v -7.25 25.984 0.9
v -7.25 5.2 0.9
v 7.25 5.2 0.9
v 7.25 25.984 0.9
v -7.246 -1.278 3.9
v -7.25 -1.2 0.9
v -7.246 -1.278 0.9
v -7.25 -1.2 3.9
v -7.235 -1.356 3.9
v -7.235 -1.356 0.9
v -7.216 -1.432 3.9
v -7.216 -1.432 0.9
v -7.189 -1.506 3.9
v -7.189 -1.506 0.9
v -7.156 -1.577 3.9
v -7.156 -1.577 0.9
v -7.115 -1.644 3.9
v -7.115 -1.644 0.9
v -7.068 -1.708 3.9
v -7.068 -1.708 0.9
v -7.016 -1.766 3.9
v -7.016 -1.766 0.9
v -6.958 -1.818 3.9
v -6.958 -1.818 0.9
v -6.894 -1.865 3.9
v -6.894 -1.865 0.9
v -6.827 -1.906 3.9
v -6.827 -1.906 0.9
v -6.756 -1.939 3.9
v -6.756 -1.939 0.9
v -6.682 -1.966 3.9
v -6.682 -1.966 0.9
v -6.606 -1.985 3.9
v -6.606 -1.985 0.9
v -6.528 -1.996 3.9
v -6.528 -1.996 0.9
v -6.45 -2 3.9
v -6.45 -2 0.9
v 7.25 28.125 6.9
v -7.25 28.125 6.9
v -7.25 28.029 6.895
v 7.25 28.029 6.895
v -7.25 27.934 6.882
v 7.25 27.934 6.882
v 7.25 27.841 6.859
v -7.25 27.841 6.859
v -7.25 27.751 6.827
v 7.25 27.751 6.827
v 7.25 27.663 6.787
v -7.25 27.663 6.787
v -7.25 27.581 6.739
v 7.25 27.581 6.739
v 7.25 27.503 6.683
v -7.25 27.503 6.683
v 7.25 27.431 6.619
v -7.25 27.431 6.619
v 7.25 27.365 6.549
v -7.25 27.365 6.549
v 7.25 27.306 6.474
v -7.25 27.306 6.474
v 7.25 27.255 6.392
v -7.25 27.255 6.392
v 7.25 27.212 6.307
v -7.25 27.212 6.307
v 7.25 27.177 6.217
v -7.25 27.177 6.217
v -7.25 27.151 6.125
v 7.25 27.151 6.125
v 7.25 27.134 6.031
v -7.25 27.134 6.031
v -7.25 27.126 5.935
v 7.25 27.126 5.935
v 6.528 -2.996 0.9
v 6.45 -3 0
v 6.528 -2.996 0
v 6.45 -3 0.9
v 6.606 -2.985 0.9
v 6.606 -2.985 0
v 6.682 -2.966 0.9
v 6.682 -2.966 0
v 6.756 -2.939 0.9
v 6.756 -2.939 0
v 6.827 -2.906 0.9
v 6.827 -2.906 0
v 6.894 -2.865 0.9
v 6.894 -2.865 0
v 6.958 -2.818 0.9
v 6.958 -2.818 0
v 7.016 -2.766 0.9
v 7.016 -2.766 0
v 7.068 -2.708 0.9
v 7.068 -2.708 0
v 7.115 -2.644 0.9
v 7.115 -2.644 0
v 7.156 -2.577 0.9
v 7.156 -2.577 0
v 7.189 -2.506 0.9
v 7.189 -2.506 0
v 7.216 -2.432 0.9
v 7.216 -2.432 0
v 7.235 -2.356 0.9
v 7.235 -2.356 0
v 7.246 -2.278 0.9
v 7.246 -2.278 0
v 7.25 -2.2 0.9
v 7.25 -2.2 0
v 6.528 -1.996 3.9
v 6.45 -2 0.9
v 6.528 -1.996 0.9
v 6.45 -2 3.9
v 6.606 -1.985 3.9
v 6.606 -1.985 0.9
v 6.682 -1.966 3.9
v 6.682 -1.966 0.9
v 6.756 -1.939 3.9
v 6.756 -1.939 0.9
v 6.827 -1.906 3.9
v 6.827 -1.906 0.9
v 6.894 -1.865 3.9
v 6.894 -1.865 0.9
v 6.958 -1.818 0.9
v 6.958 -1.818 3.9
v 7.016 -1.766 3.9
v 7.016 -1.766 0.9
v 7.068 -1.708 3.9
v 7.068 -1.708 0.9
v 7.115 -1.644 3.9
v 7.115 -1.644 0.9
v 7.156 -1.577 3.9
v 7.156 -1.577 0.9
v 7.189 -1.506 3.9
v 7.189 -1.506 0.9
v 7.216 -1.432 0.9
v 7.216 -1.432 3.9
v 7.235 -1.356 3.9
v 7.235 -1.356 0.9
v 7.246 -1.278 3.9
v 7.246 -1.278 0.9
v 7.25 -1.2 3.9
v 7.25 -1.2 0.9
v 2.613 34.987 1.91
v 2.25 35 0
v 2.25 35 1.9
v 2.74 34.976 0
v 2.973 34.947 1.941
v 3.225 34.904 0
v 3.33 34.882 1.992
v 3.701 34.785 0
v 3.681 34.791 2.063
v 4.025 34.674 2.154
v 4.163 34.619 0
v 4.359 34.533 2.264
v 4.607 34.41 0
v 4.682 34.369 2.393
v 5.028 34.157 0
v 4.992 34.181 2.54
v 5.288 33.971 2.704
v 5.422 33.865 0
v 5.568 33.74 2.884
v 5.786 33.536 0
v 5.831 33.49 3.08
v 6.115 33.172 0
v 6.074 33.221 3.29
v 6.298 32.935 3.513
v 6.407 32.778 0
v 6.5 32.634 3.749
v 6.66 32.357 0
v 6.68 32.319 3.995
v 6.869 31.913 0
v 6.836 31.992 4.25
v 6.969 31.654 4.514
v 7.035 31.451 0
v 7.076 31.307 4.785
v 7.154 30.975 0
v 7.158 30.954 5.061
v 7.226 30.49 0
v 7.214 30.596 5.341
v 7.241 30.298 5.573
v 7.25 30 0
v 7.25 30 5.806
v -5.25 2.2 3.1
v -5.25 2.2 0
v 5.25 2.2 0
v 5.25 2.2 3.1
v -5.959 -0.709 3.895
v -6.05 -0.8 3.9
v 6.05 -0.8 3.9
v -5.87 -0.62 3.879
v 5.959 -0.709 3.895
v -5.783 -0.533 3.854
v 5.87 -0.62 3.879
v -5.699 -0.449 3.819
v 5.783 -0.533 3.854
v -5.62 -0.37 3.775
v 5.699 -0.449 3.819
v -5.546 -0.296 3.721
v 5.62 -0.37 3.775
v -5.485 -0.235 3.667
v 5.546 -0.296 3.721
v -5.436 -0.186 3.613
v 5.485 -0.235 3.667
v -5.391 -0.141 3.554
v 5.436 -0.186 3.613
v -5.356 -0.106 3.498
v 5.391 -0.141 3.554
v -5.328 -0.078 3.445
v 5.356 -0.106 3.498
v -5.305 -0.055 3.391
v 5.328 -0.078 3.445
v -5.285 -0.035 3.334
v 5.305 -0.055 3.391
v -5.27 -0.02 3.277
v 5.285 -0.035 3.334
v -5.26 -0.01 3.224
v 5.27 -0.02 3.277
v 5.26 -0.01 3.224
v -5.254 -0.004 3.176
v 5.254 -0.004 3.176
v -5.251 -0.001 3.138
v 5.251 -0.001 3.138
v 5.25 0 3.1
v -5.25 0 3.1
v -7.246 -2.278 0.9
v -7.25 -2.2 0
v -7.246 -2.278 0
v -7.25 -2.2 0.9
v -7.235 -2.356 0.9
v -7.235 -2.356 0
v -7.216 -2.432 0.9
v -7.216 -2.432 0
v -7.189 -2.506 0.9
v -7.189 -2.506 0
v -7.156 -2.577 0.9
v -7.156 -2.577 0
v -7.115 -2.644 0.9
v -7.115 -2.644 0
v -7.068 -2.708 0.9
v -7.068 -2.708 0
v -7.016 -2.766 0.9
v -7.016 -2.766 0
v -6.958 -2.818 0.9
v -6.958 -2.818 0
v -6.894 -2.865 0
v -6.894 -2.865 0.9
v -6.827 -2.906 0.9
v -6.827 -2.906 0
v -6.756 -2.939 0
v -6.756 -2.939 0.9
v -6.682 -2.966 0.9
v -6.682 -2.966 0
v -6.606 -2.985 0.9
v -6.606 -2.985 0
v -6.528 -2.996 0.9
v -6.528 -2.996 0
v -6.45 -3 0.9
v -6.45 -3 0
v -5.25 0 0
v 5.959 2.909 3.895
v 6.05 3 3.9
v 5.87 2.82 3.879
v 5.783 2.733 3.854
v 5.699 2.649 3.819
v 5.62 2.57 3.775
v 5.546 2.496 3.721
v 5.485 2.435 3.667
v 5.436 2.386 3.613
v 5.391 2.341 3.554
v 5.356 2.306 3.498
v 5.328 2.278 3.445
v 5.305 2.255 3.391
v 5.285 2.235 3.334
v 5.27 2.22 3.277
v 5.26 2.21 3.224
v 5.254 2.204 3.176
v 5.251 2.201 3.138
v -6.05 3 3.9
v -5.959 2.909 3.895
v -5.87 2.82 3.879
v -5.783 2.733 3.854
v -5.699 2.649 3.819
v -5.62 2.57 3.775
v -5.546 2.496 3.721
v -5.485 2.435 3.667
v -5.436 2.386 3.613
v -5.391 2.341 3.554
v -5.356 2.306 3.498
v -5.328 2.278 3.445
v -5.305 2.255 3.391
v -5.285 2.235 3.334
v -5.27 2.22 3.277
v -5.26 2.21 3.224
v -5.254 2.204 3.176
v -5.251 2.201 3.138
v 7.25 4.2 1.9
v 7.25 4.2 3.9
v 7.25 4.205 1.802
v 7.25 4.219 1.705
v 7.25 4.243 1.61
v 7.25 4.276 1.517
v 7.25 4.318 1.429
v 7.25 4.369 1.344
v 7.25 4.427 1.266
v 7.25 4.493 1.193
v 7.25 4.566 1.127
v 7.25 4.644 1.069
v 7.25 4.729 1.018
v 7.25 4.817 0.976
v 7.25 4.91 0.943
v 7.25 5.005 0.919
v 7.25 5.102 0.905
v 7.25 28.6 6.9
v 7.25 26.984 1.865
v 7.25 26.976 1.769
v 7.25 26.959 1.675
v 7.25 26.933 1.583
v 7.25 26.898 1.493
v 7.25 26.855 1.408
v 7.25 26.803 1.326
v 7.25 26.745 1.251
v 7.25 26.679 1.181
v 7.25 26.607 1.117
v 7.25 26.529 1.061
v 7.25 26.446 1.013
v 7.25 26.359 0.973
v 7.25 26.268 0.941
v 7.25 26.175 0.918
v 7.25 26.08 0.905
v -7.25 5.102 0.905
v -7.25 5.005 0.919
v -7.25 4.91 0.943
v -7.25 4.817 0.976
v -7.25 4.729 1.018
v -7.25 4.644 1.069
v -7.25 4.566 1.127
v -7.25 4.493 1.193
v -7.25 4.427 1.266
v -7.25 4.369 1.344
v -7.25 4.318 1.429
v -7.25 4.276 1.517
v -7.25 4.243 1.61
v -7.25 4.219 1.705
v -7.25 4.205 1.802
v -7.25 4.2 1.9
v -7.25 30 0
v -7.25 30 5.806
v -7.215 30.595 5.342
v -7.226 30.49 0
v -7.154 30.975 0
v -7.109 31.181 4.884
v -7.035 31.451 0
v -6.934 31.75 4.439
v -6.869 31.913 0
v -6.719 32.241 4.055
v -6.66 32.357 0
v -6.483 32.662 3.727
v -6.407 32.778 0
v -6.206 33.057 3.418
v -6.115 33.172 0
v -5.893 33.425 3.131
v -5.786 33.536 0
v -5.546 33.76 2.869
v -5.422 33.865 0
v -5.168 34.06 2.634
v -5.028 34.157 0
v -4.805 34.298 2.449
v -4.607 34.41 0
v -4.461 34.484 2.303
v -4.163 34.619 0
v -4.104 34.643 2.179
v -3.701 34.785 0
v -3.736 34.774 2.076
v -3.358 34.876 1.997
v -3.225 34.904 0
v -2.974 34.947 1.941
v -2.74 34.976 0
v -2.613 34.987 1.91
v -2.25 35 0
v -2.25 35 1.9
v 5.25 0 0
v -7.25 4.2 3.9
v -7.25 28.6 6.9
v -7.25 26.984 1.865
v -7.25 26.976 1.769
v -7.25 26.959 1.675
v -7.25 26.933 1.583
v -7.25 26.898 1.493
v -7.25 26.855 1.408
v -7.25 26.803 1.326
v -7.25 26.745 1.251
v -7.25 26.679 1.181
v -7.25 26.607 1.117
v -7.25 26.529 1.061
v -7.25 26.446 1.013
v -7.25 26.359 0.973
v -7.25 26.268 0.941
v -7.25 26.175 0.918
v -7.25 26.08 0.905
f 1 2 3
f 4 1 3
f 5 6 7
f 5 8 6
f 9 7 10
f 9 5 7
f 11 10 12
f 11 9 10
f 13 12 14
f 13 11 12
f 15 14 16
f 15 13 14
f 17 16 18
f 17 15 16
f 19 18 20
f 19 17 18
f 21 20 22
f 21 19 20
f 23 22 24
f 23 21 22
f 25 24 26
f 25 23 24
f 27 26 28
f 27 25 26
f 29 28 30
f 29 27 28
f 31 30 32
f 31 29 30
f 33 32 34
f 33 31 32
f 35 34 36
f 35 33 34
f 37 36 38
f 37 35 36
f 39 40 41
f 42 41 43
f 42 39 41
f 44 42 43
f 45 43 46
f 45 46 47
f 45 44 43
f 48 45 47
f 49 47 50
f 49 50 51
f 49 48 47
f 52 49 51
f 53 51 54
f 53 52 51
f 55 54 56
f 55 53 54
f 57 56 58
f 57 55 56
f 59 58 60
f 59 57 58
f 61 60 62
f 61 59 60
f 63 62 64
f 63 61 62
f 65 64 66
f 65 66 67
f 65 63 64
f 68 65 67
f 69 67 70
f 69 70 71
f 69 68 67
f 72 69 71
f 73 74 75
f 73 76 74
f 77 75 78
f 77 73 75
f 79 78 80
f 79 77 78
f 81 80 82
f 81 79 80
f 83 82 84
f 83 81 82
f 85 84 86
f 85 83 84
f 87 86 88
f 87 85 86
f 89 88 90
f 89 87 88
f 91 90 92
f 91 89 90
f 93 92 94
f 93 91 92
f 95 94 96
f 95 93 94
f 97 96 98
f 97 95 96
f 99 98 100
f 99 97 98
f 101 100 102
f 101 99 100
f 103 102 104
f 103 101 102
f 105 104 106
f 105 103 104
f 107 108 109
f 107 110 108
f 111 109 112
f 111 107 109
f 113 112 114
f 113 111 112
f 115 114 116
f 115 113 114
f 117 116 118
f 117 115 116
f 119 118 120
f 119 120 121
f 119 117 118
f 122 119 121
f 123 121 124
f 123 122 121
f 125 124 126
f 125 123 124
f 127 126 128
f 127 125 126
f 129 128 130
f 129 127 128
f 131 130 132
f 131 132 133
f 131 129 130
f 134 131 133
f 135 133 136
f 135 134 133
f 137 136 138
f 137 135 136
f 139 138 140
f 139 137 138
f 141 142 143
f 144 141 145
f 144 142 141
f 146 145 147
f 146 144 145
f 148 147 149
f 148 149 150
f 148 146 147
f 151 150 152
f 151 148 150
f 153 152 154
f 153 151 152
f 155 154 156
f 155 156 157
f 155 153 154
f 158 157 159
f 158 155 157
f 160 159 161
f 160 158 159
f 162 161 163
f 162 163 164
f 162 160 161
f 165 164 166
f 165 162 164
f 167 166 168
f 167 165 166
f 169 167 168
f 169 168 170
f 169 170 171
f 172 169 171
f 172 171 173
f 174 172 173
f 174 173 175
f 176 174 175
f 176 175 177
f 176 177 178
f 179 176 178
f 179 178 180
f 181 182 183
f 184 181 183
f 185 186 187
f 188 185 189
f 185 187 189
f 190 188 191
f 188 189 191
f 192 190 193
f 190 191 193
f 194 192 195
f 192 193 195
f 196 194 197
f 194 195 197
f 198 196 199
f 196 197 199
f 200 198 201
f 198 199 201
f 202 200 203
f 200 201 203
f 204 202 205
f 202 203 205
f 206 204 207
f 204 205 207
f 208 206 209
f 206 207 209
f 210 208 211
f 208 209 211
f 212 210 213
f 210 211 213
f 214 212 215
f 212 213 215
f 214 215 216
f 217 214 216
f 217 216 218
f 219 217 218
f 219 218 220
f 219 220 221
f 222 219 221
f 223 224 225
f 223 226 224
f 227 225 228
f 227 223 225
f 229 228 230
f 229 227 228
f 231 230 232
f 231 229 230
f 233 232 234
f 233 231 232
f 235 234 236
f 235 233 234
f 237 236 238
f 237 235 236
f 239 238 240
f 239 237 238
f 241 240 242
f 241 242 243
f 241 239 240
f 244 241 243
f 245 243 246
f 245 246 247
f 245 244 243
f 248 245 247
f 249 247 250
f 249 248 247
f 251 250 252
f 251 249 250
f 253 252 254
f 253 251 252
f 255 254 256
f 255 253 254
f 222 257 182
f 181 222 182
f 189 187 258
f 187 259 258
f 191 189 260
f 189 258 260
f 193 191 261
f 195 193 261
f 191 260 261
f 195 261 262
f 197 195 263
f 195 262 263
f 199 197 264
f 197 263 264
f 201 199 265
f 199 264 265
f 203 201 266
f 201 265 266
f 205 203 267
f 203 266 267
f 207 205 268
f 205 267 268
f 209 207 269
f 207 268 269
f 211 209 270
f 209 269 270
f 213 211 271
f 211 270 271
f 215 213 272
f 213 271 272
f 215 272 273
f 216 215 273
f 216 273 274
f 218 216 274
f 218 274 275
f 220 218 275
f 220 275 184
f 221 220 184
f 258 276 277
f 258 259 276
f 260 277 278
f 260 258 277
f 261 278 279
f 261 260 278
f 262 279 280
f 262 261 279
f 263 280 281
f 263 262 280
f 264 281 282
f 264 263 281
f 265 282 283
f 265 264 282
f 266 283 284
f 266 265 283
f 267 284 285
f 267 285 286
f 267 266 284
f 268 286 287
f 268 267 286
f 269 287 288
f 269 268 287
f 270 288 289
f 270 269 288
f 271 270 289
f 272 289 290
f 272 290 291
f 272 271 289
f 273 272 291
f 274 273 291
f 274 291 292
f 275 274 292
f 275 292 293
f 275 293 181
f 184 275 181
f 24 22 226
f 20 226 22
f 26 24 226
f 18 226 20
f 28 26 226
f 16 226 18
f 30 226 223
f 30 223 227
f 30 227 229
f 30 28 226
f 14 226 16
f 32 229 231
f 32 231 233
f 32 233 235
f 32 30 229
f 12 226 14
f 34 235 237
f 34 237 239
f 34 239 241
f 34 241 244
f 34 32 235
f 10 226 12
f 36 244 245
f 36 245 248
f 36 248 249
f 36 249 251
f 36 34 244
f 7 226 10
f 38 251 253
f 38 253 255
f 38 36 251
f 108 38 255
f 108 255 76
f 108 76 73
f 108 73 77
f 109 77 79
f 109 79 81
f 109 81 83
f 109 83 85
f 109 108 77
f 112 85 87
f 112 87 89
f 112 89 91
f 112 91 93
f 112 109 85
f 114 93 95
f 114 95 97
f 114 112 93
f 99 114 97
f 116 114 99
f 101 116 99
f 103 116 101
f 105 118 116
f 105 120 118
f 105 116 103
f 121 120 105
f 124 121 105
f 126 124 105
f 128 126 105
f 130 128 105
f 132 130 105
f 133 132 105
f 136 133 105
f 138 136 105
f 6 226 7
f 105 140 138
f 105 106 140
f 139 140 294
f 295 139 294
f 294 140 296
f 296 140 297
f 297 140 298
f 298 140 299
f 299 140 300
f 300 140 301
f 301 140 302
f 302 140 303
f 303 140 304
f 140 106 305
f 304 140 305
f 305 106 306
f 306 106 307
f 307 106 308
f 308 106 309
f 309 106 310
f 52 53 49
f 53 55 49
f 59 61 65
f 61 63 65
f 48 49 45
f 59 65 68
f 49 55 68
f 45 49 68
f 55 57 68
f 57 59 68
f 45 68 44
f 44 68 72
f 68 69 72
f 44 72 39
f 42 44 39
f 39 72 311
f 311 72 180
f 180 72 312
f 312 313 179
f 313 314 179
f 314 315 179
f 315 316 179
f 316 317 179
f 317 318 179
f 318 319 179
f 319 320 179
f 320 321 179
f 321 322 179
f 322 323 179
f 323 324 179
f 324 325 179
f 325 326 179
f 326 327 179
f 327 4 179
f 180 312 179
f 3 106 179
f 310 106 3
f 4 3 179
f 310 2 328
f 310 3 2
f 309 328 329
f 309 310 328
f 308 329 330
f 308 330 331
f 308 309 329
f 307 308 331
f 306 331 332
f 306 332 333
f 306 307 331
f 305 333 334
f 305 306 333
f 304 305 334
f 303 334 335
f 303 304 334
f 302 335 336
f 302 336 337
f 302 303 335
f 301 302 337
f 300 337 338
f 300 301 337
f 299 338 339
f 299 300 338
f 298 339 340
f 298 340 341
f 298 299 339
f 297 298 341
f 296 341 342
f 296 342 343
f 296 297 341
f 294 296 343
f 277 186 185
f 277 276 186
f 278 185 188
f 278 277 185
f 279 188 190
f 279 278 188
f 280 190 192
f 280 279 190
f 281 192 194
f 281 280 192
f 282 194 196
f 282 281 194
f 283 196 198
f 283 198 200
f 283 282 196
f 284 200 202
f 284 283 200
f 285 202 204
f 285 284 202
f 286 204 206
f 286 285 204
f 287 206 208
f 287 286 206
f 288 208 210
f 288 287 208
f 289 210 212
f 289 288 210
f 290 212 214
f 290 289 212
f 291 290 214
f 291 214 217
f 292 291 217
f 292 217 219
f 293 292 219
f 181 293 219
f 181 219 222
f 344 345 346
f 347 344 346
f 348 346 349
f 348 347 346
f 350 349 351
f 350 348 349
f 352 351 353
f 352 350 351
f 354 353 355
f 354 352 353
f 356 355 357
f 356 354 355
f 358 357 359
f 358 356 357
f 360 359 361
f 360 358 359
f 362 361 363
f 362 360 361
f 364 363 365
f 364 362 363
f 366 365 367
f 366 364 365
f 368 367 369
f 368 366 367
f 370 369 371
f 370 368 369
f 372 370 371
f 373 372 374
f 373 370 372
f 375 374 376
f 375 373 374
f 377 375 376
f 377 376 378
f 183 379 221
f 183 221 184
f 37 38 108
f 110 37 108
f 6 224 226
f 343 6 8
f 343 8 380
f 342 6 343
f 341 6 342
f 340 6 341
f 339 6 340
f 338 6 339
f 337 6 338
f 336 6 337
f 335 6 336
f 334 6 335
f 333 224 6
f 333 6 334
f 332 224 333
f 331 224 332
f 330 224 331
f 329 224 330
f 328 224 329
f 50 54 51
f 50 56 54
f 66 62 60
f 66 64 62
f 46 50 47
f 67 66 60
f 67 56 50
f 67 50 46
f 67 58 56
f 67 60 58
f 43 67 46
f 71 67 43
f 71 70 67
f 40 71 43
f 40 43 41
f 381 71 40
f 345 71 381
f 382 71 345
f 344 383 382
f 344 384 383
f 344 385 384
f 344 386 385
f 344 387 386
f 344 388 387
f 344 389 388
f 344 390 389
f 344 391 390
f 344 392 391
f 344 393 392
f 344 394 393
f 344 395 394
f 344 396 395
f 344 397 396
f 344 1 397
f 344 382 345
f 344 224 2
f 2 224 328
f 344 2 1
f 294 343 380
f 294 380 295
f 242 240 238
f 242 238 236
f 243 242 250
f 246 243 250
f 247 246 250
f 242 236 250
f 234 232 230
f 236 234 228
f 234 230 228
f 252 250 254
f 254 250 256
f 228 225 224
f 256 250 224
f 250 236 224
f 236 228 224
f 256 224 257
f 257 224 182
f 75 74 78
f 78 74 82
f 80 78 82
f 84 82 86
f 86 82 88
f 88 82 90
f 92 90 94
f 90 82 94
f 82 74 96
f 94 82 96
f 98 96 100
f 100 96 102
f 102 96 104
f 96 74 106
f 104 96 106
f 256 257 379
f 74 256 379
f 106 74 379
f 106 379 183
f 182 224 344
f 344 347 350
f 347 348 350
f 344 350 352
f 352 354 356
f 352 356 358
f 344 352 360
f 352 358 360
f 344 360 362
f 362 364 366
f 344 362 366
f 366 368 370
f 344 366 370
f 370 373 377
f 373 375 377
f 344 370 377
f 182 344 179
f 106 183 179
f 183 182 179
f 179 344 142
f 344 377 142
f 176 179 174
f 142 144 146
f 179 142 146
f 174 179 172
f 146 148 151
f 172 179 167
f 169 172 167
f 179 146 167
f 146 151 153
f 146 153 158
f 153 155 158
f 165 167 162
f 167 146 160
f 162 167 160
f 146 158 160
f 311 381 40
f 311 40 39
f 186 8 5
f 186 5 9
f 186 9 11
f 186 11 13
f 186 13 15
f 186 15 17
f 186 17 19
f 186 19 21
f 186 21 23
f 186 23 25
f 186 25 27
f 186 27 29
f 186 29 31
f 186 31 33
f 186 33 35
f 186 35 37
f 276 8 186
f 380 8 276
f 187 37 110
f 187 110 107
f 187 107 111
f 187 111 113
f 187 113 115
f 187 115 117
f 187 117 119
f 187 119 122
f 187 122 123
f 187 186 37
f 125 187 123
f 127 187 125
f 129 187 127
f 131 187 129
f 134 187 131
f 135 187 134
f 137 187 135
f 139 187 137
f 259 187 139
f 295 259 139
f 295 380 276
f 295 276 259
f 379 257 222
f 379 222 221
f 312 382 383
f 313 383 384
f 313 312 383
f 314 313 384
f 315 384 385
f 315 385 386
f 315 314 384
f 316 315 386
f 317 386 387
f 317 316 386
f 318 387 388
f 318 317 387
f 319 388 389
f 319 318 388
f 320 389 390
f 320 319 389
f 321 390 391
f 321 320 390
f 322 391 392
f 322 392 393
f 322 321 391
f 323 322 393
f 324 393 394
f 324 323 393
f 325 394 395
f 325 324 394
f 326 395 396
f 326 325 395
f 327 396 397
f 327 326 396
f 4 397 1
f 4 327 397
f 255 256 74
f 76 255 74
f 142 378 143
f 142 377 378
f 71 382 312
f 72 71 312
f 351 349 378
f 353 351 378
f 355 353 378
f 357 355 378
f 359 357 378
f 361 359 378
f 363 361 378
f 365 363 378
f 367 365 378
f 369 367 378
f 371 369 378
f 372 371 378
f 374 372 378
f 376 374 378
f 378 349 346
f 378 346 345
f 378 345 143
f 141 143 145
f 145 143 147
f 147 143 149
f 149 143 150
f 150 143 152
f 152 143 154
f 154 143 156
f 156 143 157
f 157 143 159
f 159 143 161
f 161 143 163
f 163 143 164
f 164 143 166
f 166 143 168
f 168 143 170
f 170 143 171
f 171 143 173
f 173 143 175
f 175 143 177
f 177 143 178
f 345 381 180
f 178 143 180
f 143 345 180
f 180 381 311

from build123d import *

# Parameters (mm, degrees)
SKETCH1_W           = 14.5
SKETCH1_H           = 38
SKETCH1_W_2         = 10.5
SKETCH1_H_2         = 2.2
BOSS_EXTRUDE1_DEPTH = 0.9
SKETCH2_W           = 14.5
SKETCH2_H           = 8.05
BOSS_EXTRUDE2_DEPTH = 6
DRAFT1_ANGLE        = 2
SKETCH2_3_W         = 14.5
SKETCH2_3_H         = 6.2
SKETCH2_3_W_2       = 10.5
SKETCH2_3_H_2       = 2.2
BOSS_EXTRUDE3_DEPTH = 3
CHAMFER1_SIZE       = 5
CHAMFER1_SIZE2      = 6.399708161
FILLET2_R           = 1
FILLET3_R           = 1
FILLET4_R           = 5
FILLET5_R           = 0.8


with BuildPart() as part:
    # Sketch1 → Boss-Extrude1 (new body)
    with BuildSketch(Plane.XY):
        with Locations((0, 16)):
            Rectangle(SKETCH1_W, SKETCH1_H)
        with Locations((0, 1.1)):
            Rectangle(SKETCH1_W_2, SKETCH1_H_2, mode=Mode.SUBTRACT)
    extrude(amount=BOSS_EXTRUDE1_DEPTH)

    # Sketch2 → Boss-Extrude2 (add)
    with BuildSketch(Plane.XY.offset(0.9)):
        with Locations((0, 30.975)):
            Rectangle(SKETCH2_W, SKETCH2_H)
    extrude(amount=BOSS_EXTRUDE2_DEPTH)

    # Draft1
    draft1_faces = [part.faces().sort_by_distance(p)[0] for p in [
        (0, 26.95, 3.9),
    ]]
    draft(draft1_faces, Plane.XY.offset(0.9), DRAFT1_ANGLE)

    # Sketch2<3> → Boss-Extrude3 (add)
    with BuildSketch(Plane.XY.offset(0.9)):
        with Locations((0, 1.1)):
            Rectangle(SKETCH2_3_W, SKETCH2_3_H)
        with Locations((0, 1.1)):
            Rectangle(SKETCH2_3_W_2, SKETCH2_3_H_2, mode=Mode.SUBTRACT)
    extrude(amount=BOSS_EXTRUDE3_DEPTH)

    # Chamfer1
    chamfer1_edges = [part.edges().sort_by_distance(p)[0] for p in [
        (0, 35, 6.9),
    ]]
    chamfer1_side = [part.faces().sort_by_distance(p)[0] for p in [
        (0, 35, 3.45),
    ]]
    chamfer(chamfer1_edges, length=CHAMFER1_SIZE, length2=CHAMFER1_SIZE2, reference=chamfer1_side[0])

    # Fillet2
    fillet2_edges = [part.edges().sort_by_distance(p)[0] for p in [
        (0, 27.159524617, 6.9),
    ]]
    fillet(fillet2_edges, radius=FILLET2_R)

    # Fillet3
    fillet3_edges = [part.edges().sort_by_distance(p)[0] for p in [
        (0, 26.95, 0.9),
        (0, 4.2, 0.9),
    ]]
    fillet(fillet3_edges, radius=FILLET3_R)

    # Fillet4
    fillet4_edges = [part.edges().sort_by_distance(p)[0] for p in [
        (-7.25, 35, 0.95),
        (7.25, 35, 0.95),
    ]]
    fillet(fillet4_edges, radius=FILLET4_R)

    # Fillet5
    fillet5_edges = [part.edges().sort_by_distance(p)[0] for p in [
        (7.25, -2, 2.4),
        (-7.25, -2, 2.4),
        (0, 0, 3.9),
        (-5.25, 1.1, 3.9),
        (0, 2.2, 3.9),
        (5.25, 1.1, 3.9),
        (7.25, -3, 0.45),
        (-7.25, -3, 0.45),
    ]]
    fillet(fillet5_edges, radius=FILLET5_R)


solid = part.part
